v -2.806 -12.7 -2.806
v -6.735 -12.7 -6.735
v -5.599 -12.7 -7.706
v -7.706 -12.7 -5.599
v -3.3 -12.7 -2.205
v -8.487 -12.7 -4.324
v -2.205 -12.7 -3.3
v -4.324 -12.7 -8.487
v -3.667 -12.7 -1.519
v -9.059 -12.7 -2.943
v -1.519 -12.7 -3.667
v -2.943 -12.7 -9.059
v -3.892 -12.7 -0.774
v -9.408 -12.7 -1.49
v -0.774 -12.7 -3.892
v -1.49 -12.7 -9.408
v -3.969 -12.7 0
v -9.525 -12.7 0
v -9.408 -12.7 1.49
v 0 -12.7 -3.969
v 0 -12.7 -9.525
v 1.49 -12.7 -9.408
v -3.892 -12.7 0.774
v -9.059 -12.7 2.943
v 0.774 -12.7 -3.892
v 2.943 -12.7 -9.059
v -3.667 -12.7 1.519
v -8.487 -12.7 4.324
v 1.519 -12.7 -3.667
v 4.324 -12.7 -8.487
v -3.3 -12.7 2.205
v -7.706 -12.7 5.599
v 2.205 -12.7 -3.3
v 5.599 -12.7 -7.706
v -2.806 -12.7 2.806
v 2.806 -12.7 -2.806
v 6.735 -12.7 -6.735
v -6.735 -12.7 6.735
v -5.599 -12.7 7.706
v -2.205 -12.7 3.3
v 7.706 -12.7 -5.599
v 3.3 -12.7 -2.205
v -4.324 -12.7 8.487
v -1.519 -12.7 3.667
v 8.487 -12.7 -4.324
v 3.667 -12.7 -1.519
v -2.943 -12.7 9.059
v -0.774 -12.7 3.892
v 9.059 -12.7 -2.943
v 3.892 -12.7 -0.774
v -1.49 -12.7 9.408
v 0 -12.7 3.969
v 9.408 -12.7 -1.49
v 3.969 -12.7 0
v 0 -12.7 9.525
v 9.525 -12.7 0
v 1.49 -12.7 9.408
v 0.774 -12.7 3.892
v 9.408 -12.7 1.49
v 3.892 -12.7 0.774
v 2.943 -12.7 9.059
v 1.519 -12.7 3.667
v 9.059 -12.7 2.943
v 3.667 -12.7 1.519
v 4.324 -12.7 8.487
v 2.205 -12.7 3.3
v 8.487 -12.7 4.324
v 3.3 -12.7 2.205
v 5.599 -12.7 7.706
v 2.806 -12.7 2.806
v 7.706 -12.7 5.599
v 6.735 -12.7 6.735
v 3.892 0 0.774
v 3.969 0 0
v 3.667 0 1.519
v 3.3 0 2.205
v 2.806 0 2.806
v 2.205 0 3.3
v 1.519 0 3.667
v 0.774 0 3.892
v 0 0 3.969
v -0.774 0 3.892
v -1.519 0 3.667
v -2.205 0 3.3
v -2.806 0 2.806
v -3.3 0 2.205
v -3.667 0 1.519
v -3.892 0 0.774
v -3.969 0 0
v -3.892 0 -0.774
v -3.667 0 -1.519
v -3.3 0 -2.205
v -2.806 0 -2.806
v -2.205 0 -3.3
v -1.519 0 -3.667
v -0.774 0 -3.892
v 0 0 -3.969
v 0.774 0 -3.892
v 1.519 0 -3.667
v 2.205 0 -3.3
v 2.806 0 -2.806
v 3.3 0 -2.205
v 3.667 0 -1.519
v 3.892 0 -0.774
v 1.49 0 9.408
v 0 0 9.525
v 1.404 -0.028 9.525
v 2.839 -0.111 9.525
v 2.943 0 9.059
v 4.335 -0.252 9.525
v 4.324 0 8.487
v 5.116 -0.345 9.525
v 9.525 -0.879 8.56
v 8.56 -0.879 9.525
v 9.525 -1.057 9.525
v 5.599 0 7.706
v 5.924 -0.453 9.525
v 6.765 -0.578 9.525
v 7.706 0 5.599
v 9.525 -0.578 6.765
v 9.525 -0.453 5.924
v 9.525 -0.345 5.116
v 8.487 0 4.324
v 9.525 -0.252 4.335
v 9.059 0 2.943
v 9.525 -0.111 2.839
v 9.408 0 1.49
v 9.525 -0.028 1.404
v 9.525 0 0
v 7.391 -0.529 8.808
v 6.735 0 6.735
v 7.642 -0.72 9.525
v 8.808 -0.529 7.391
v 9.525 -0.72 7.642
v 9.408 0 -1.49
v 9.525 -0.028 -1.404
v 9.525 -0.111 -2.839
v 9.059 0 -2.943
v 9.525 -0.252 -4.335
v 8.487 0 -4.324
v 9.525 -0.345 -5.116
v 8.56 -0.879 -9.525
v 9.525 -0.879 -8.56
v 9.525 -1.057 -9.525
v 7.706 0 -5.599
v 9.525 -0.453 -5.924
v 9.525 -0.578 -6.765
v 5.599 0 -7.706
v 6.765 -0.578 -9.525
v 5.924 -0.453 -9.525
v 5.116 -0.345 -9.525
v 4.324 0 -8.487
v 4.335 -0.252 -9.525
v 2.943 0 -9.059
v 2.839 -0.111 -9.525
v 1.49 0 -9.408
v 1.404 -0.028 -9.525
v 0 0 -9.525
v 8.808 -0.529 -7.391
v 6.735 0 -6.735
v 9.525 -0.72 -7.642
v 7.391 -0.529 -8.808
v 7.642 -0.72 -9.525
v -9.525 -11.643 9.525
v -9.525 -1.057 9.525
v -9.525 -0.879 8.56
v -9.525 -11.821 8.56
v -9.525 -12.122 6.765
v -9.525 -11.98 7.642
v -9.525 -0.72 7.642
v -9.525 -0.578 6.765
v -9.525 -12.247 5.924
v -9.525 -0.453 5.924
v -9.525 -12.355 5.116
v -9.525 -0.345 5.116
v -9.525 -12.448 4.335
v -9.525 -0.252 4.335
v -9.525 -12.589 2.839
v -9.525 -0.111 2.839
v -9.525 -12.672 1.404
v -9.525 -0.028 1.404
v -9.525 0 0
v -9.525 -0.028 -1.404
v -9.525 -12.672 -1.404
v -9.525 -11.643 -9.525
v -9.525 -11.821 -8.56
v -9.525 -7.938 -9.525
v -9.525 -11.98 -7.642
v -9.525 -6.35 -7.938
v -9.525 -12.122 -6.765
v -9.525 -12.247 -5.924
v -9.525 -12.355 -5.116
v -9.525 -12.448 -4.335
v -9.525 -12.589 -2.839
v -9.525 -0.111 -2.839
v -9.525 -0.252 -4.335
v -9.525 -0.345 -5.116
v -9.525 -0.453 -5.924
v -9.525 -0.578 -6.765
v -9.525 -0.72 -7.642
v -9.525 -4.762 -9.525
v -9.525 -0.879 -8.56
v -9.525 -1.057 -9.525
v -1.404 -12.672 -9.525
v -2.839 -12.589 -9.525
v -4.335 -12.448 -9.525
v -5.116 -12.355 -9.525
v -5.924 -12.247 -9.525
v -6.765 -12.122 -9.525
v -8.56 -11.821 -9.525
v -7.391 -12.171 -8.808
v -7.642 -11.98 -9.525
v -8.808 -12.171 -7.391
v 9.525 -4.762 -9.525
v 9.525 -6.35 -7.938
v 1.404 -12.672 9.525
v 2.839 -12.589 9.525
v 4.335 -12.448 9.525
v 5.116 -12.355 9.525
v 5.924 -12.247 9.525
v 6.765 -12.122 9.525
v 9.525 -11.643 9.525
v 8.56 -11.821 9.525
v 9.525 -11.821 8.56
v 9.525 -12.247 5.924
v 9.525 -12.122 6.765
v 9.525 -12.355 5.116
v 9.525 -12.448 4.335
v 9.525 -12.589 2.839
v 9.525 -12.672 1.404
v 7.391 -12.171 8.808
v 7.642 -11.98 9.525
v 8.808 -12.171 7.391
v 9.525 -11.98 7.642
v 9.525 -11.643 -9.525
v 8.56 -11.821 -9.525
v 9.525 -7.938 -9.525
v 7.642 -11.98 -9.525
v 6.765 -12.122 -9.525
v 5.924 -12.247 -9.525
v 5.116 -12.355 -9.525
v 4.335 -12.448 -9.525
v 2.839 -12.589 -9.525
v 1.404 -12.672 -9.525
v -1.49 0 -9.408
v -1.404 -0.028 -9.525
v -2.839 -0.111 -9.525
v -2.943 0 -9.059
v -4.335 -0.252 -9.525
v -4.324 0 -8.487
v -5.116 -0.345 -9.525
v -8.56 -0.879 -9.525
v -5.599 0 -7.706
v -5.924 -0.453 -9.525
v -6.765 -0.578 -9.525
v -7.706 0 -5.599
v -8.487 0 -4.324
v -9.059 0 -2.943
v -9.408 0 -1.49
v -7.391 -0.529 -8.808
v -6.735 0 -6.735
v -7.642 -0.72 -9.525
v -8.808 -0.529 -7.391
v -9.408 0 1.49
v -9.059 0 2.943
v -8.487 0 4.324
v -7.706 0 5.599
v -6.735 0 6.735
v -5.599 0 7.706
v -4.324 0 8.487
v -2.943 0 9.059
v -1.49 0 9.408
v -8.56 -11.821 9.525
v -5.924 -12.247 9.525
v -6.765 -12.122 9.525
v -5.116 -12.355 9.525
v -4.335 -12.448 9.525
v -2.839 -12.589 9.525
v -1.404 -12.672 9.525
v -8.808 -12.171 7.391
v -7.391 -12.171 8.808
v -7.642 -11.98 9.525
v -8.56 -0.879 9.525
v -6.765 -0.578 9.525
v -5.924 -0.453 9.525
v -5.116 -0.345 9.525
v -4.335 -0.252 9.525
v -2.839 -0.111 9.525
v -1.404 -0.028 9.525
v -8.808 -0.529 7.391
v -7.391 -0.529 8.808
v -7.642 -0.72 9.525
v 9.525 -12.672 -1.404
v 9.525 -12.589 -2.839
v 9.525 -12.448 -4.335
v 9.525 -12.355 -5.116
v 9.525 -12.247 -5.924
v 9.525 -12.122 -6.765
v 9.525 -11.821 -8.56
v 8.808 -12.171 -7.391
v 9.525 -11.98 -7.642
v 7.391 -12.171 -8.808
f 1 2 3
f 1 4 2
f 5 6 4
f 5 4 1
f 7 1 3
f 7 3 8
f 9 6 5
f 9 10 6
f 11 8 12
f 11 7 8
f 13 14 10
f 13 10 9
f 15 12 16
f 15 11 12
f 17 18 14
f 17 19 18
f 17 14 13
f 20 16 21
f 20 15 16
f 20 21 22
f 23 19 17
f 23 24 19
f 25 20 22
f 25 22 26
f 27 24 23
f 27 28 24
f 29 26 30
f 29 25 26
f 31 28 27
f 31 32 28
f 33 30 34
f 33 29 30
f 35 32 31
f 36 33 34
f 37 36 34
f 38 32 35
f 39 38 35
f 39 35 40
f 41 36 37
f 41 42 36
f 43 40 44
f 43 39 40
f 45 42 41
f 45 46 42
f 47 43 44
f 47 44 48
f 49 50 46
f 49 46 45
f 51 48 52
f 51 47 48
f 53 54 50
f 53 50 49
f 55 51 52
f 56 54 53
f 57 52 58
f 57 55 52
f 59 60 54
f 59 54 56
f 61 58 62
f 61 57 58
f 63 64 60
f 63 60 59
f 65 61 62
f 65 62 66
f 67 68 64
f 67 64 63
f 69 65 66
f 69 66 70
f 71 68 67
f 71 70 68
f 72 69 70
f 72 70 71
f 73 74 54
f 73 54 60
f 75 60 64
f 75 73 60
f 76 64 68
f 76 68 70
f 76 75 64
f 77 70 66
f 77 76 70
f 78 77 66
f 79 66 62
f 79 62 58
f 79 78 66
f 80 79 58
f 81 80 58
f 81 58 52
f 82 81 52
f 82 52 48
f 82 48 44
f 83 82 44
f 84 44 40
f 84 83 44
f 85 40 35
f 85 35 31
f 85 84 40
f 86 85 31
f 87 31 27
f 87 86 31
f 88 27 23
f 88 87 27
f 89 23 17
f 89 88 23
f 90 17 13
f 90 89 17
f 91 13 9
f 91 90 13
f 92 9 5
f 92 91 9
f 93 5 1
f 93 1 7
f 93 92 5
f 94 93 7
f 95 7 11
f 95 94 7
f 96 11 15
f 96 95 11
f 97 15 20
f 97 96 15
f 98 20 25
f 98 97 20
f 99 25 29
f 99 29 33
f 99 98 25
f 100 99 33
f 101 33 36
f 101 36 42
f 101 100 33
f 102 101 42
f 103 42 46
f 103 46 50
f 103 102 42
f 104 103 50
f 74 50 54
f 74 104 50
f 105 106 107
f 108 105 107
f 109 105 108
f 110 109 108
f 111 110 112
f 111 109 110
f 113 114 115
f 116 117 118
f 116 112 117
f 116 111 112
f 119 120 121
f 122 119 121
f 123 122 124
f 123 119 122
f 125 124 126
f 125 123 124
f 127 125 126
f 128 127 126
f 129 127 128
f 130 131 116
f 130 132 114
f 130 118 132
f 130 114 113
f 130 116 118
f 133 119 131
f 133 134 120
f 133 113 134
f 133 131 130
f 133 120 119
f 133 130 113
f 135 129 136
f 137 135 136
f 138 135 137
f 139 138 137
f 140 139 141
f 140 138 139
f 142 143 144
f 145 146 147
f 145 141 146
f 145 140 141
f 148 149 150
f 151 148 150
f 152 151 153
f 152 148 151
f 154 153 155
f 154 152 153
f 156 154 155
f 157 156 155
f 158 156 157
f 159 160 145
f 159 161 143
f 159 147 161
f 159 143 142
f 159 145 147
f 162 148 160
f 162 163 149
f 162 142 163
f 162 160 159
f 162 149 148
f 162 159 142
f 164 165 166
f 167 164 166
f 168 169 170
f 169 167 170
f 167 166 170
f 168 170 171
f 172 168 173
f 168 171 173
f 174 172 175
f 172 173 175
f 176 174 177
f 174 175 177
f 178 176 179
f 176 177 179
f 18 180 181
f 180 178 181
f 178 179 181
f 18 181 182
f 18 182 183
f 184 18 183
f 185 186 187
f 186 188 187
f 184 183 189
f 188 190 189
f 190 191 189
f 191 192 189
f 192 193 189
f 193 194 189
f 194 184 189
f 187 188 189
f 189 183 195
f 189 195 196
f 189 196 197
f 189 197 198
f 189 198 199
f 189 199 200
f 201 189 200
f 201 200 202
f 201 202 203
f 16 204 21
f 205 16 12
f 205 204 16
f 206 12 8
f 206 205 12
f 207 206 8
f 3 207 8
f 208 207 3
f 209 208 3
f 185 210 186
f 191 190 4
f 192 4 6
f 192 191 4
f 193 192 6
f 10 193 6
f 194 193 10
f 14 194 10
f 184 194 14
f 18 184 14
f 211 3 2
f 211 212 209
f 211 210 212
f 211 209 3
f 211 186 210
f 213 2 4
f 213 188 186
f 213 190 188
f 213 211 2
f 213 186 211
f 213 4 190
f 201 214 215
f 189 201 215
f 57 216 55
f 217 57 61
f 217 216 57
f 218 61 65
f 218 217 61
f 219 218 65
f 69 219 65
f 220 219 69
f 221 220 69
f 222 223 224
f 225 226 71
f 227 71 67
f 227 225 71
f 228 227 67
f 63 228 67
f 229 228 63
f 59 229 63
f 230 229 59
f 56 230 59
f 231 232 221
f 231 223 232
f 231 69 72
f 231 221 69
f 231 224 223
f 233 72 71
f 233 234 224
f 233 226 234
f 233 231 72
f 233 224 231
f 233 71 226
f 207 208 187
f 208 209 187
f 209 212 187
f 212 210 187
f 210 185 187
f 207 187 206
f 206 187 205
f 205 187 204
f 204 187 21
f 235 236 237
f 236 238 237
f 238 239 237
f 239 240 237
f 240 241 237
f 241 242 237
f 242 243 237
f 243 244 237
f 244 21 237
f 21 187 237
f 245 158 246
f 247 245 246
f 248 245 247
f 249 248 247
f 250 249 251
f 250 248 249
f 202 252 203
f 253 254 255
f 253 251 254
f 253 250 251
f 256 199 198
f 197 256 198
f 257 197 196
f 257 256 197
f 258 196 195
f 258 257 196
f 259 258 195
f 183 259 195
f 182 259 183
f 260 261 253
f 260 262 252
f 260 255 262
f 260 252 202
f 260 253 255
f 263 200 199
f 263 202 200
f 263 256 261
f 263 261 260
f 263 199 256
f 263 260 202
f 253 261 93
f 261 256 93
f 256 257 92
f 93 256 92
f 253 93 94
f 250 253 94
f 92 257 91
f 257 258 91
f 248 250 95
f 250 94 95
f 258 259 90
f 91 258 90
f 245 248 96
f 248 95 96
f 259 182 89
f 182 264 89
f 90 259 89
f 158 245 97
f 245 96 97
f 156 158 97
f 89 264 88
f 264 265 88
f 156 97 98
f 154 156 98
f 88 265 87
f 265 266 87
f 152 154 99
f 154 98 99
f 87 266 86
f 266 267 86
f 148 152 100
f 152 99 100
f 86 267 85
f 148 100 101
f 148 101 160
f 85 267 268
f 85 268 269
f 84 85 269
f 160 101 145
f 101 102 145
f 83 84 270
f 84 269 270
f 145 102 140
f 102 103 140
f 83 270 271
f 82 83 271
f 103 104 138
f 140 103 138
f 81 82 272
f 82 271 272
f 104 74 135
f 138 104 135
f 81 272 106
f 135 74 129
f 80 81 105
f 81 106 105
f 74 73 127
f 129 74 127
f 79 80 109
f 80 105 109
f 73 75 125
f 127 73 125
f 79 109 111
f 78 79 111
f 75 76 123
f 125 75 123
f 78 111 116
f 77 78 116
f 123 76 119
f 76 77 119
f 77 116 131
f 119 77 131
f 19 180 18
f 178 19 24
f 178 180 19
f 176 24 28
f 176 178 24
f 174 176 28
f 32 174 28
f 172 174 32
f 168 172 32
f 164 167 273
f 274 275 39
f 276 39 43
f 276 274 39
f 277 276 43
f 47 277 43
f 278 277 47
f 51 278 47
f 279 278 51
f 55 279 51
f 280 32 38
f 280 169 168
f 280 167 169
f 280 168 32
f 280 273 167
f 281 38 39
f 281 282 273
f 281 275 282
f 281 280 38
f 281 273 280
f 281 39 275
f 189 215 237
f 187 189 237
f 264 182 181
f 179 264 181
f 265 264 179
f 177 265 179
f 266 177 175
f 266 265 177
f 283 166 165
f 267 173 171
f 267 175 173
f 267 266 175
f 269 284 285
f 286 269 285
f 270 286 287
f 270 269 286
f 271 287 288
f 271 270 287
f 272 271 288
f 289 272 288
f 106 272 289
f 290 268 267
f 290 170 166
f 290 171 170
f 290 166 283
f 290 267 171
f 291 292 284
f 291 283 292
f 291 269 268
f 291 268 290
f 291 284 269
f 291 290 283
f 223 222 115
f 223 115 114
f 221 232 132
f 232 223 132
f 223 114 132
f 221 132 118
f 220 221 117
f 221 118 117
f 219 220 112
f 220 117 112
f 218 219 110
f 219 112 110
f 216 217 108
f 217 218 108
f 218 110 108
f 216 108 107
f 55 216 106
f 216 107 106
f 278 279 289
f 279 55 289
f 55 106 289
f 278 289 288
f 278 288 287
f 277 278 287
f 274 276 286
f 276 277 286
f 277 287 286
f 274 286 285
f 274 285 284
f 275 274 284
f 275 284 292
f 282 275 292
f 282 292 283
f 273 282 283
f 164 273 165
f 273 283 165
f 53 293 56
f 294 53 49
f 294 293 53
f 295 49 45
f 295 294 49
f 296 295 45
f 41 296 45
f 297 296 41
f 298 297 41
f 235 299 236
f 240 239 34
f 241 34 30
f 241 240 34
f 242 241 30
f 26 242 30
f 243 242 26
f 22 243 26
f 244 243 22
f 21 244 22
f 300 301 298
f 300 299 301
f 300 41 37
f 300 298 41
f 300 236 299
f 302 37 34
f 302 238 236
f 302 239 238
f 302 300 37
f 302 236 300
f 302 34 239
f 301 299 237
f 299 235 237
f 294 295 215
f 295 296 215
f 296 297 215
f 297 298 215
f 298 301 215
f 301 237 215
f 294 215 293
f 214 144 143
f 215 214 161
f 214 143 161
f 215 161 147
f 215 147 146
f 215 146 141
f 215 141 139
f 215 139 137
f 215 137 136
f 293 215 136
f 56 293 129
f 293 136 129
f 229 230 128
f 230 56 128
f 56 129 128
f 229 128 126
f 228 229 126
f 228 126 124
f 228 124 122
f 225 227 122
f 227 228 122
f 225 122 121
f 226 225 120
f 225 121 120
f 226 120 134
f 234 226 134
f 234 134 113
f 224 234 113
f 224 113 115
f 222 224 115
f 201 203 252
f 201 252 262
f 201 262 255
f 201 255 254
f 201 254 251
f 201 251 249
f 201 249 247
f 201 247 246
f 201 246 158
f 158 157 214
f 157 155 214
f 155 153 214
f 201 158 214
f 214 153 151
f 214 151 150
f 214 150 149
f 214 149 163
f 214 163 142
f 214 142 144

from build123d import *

# Parameters (mm, degrees)
F0_R     = 3.96875
F1_DEPTH = 12.7
F3_DEPTH = 19.05


with BuildPart() as f1:
    # F0 (on Front) → F1 (new body)
    with BuildSketch(Plane.XZ):
        with BuildLine():
            Line((-9.525, 0), (-9.525, -9.525))
            Line((-9.525, -9.525), (0, -9.525))
            ThreePointArc((0, -9.525), (-6.7351920908, -6.7351920908), (-9.525, 0))
        make_face()
        with BuildLine():
            ThreePointArc((9.525, 0), (6.7351920908, -6.7351920908), (0, -9.525))
            Line((0, -9.525), (9.525, -9.525))
            Line((9.525, -9.525), (9.525, 0))
        make_face()
        with BuildLine():
            ThreePointArc((-9.525, 0), (-6.7351920908, -6.7351920908), (0, -9.525))
            ThreePointArc((0, -9.525), (6.7351920908, -6.7351920908), (9.525, 0))
            ThreePointArc((9.525, 0), (6.7351920908, 6.7351920908), (0, 9.525))
            ThreePointArc((0, 9.525), (-6.7351920908, 6.7351920908), (-9.525, 0))
        make_face()
        Circle(F0_R, mode=Mode.SUBTRACT)
        with BuildLine():
            Line((-9.525, 9.525), (-9.525, 0))
            ThreePointArc((-9.525, 0), (-6.7351920908, 6.7351920908), (0, 9.525))
            Line((0, 9.525), (-9.525, 9.525))
        make_face()
        with BuildLine():
            ThreePointArc((0, 9.525), (6.7351920908, 6.7351920908), (9.525, 0))
            Line((9.525, 0), (9.525, 9.525))
            Line((9.525, 9.525), (0, 9.525))
        make_face()
    extrude(amount=F1_DEPTH)

    # F2 (on face) → F3 (cut)
    with BuildSketch(Plane.YZ.offset(9.525)):
        Polygon((-4.7625, -9.525), (-6.35, -7.9375), (-7.9375, -9.525), align=None)
    extrude(amount=-F3_DEPTH, mode=Mode.SUBTRACT)

    # F5 (on mid) → F6 (revolve, cut)
    with BuildSketch(Plane.YZ):
        Polygon((-12.7, 20.5410033949), (-12.7, 9.525), (-9.7482707865, 20.5410033949), align=None)
        Polygon((-2.9517292135, 20.5410033949), (0, 9.525), (0, 20.5410033949), align=None)
    revolve(axis=Axis((0, 0, 0), (0, 1, 0)), mode=Mode.SUBTRACT)


solid = f1.part
